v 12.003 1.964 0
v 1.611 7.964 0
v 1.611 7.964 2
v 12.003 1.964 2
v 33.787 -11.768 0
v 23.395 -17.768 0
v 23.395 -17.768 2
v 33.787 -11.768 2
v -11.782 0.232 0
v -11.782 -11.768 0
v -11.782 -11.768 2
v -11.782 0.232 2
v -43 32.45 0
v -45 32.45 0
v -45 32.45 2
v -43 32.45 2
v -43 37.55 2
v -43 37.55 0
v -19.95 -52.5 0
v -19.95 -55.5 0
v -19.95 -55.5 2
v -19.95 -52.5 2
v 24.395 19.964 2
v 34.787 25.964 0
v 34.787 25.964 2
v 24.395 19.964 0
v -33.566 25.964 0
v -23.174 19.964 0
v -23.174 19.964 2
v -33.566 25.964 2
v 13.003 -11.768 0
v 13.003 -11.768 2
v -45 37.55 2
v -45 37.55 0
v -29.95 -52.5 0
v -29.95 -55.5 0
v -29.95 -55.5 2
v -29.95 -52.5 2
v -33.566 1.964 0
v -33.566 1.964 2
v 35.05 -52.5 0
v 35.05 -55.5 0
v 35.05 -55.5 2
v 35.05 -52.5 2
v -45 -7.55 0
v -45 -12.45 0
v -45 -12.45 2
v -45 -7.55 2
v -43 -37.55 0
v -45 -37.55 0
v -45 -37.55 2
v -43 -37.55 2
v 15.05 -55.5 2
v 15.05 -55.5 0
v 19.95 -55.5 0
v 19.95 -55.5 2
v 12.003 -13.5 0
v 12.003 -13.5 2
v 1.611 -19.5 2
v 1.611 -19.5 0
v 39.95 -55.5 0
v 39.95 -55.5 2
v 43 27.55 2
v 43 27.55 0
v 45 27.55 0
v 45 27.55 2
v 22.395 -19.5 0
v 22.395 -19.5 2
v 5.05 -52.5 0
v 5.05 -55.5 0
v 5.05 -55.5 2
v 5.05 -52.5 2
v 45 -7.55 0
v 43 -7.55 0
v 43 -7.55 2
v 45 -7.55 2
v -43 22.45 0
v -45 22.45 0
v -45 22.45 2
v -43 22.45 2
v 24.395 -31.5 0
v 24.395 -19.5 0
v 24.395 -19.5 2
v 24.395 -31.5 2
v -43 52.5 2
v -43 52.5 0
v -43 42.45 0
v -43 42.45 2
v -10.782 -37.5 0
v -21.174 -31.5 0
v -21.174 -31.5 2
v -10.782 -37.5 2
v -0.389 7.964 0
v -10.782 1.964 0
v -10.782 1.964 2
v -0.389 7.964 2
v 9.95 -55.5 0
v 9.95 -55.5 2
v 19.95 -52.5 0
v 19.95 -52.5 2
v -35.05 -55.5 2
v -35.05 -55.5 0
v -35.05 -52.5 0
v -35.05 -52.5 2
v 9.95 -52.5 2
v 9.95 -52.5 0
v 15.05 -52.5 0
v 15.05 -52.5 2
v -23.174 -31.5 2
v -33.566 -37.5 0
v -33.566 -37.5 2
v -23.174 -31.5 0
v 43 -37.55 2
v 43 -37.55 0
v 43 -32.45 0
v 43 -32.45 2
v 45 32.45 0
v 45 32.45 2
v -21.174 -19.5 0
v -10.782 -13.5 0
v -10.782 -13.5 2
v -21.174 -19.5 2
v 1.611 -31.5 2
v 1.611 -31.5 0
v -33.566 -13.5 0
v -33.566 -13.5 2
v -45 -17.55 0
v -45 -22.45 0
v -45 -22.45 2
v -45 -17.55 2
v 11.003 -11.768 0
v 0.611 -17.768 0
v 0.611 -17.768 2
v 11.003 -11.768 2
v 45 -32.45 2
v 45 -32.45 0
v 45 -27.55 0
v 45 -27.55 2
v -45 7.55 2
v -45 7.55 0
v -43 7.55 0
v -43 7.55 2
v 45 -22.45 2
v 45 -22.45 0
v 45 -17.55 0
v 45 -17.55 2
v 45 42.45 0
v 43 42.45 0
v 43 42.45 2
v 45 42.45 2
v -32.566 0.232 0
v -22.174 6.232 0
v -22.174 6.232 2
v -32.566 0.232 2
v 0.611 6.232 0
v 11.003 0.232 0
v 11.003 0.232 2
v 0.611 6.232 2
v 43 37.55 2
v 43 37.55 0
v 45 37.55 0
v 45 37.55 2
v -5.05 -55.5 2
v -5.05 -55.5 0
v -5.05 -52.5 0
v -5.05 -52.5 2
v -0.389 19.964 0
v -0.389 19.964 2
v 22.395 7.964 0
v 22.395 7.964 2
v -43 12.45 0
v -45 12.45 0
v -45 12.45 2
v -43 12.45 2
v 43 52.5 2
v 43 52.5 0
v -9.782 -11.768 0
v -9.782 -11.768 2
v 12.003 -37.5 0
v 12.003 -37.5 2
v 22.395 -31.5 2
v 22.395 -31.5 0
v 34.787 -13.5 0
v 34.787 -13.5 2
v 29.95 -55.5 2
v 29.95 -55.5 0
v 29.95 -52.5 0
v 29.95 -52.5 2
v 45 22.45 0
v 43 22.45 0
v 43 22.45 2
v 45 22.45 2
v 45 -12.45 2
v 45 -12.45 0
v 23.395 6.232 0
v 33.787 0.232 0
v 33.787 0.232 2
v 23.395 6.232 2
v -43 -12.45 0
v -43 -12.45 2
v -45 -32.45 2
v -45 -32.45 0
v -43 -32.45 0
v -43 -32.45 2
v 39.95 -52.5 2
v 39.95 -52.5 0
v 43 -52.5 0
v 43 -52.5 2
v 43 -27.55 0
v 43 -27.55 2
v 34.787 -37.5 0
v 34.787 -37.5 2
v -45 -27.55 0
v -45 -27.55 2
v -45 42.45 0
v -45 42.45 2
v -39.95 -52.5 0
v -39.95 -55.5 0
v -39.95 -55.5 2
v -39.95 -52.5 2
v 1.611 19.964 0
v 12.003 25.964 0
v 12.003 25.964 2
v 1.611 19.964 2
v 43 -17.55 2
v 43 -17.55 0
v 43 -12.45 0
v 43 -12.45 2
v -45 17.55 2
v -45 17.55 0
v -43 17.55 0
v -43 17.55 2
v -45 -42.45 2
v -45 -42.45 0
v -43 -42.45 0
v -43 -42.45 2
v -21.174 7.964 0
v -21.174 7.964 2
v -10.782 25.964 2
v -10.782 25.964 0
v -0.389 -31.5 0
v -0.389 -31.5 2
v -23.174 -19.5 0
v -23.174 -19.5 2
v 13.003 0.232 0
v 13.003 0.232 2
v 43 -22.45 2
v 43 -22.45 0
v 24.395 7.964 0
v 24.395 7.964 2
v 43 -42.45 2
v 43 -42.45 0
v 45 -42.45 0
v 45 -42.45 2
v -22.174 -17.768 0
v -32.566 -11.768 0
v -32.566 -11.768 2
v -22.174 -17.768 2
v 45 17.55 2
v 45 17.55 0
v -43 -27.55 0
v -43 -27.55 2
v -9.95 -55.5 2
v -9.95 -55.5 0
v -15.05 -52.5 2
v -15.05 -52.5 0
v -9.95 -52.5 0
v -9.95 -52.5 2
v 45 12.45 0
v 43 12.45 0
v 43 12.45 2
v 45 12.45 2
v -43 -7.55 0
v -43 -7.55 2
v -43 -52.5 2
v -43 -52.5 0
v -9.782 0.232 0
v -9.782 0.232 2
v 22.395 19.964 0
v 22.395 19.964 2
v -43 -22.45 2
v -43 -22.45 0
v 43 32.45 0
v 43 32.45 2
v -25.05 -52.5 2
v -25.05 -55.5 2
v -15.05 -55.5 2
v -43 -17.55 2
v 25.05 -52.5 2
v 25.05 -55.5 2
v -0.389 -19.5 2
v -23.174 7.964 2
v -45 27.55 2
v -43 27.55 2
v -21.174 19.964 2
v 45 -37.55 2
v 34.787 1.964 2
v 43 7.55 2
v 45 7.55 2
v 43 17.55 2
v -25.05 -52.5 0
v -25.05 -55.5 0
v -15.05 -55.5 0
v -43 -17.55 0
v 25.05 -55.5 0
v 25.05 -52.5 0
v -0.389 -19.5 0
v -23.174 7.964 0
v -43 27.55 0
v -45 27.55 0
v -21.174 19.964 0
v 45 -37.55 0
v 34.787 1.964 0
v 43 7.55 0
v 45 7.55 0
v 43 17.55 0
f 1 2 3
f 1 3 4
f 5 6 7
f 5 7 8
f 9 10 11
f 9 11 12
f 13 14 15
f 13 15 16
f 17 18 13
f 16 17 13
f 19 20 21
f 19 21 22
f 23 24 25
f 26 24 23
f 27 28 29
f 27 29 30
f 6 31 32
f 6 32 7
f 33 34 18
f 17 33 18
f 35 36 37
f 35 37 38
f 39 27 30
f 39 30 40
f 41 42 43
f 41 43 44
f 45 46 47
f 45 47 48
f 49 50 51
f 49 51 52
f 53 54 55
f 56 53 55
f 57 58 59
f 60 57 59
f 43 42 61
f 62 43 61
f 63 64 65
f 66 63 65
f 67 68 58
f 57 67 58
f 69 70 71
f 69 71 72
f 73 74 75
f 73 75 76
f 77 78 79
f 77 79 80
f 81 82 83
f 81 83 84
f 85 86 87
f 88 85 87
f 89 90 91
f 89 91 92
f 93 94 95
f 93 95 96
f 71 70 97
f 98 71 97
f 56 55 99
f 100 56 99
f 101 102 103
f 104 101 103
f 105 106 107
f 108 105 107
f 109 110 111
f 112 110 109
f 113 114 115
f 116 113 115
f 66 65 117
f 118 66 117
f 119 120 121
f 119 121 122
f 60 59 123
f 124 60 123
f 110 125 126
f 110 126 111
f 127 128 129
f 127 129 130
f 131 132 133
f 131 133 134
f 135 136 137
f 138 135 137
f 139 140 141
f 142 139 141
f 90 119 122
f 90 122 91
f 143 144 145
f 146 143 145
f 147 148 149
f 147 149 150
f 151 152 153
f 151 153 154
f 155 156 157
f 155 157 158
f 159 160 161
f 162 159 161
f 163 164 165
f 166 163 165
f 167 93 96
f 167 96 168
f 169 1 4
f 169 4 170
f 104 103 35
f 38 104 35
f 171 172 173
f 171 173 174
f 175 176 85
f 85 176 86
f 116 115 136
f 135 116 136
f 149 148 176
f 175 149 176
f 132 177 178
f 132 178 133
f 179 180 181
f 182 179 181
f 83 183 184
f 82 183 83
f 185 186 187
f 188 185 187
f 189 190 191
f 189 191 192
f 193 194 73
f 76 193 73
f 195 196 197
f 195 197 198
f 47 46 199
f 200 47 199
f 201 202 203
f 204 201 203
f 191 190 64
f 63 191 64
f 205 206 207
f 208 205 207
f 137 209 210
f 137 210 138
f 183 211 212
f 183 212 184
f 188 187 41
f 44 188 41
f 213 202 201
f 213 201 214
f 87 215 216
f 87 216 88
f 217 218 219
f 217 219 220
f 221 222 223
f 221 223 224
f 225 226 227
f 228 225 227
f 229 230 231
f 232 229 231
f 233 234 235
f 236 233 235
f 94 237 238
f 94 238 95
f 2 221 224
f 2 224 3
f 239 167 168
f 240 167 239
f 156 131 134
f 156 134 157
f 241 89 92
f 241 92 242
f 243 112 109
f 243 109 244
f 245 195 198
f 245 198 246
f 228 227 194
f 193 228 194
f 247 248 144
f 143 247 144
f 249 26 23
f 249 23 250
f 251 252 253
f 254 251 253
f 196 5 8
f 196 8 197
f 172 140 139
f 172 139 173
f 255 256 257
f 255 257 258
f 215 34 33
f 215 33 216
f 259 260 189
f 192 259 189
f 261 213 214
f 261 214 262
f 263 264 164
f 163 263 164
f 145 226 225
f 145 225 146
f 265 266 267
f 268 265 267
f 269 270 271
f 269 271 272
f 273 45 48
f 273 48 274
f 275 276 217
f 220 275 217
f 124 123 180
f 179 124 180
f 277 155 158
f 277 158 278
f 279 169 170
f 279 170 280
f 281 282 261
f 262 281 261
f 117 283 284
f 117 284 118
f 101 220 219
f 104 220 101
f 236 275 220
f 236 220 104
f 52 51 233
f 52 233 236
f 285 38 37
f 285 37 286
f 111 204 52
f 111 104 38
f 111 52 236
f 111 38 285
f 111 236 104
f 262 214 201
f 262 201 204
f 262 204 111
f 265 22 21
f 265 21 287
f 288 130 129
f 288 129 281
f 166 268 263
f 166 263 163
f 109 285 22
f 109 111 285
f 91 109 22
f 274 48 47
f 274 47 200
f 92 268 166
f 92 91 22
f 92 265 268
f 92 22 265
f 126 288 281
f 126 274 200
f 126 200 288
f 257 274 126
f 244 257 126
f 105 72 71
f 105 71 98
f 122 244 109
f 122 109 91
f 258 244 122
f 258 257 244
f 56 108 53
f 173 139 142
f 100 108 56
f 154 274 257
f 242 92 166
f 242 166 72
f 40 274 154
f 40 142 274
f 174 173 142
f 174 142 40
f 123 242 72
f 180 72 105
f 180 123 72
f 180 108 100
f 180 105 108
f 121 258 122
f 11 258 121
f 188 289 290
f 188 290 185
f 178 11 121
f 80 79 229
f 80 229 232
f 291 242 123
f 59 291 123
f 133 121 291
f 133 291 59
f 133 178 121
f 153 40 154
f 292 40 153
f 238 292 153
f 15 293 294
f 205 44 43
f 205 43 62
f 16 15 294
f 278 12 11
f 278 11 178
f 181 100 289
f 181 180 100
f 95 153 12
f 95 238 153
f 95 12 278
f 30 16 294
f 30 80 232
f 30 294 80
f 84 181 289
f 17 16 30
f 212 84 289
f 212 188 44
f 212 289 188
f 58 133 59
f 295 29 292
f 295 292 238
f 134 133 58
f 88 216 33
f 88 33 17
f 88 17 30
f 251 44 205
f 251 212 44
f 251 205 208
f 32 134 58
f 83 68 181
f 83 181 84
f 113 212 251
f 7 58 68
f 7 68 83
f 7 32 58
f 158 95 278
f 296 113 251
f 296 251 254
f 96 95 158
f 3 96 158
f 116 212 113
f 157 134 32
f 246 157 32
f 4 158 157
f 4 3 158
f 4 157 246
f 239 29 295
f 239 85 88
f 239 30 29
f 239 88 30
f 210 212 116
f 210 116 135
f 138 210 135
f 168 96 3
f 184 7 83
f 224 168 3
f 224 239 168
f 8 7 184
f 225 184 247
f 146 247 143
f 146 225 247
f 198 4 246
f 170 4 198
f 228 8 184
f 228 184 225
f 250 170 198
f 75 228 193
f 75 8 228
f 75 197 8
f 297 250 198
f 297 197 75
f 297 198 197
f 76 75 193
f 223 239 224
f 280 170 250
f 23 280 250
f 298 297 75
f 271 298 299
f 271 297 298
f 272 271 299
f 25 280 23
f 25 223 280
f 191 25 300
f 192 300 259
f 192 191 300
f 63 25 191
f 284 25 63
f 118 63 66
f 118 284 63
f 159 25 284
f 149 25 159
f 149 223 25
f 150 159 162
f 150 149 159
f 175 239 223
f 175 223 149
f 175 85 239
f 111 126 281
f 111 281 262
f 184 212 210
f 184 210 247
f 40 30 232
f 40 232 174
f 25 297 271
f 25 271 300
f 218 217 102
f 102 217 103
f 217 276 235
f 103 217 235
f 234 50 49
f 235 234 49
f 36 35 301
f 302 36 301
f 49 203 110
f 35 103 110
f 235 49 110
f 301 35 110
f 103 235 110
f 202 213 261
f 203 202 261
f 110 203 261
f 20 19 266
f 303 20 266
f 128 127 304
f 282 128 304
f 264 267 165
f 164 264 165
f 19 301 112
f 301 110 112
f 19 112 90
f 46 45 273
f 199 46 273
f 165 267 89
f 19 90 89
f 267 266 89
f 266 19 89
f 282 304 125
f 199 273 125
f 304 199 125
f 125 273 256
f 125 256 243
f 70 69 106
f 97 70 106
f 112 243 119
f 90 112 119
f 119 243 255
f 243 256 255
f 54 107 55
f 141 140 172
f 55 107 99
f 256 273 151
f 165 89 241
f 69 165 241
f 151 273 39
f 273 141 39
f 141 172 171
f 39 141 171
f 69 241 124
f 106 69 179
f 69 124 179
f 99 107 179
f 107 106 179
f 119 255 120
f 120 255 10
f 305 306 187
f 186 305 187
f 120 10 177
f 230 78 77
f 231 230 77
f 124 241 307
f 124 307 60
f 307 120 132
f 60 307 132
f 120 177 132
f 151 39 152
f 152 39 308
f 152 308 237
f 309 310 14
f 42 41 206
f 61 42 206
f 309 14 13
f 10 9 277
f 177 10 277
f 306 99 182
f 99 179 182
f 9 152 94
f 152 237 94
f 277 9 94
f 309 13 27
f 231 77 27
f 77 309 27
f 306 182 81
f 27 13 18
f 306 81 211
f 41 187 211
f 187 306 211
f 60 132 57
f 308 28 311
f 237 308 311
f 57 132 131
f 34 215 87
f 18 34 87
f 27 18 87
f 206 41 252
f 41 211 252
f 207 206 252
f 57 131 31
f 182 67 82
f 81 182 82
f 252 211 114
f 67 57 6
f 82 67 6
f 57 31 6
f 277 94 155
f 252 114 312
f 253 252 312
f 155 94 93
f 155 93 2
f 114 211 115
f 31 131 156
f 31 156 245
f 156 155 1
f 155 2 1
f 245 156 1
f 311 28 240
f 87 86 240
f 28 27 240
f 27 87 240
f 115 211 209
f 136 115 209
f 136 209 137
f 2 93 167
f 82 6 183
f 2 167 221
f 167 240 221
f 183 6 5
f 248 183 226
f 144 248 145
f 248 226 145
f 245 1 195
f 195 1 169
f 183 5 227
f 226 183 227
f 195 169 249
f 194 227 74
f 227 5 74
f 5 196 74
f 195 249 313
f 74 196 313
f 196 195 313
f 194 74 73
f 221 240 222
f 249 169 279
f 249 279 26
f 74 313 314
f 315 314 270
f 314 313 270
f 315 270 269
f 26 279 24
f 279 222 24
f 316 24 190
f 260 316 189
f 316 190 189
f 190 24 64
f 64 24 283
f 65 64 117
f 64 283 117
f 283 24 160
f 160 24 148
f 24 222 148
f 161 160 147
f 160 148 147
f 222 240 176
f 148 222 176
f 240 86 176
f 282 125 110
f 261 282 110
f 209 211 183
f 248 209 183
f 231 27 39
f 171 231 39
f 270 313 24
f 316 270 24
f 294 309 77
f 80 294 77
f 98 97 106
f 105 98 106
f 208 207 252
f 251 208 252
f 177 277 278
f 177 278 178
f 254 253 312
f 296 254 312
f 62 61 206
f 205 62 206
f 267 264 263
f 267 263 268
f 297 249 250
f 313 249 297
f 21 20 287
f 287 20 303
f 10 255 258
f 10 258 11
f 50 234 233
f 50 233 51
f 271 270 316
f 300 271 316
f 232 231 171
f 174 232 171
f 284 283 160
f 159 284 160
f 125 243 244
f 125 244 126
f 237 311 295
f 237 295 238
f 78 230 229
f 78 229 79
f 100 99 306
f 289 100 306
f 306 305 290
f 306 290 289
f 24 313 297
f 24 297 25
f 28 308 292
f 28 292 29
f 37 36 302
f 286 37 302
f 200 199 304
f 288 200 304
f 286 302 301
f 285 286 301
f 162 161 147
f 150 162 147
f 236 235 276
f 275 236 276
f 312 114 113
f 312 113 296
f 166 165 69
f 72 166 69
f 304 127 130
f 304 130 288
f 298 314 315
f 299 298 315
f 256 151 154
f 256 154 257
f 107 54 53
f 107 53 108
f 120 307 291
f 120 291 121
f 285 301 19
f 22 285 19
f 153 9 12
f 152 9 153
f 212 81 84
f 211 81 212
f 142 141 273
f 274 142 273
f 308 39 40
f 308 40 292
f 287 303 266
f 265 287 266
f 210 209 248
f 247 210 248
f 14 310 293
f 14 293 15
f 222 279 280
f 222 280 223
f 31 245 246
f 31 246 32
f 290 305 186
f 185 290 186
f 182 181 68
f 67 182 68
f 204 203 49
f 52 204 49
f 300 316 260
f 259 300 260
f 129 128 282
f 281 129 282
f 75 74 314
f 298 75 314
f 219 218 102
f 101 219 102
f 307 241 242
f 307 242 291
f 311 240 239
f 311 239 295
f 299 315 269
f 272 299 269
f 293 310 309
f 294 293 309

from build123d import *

# Parameters (mm, degrees)
F0_W     = 2
F0_H     = 4.9
F0_W_2   = 4.9
F0_H_2   = 3
F2_DEPTH = 2
F3_DEPTH = 12.5


with BuildPart() as f2:
    # F0 (on Top) → F2 (new body)
    with BuildSketch(Plane.XY):
        with Locations((44, -20)):
            Rectangle(F0_W, F0_H)
        with Locations((-7.5, -54)):
            Rectangle(F0_W_2, F0_H_2)
        with Locations((44, 30)):
            Rectangle(F0_W, F0_H)
        with Locations((17.5, -54)):
            Rectangle(F0_W_2, F0_H_2)
        with Locations((44, 20)):
            Rectangle(F0_W, F0_H)
        with Locations((-44, 30)):
            Rectangle(F0_W, F0_H)
        with Locations((-44, -30)):
            Rectangle(F0_W, F0_H)
        with Locations((44, 10)):
            Rectangle(F0_W, F0_H)
        with Locations((-44, 40)):
            Rectangle(F0_W, F0_H)
        with Locations((-44, -40)):
            Rectangle(F0_W, F0_H)
        with Locations((44, -10)):
            Rectangle(F0_W, F0_H)
        with Locations((-44, 20)):
            Rectangle(F0_W, F0_H)
        with Locations((-44, -20)):
            Rectangle(F0_W, F0_H)
        with Locations((44, 40)):
            Rectangle(F0_W, F0_H)
        with Locations((-44, 10)):
            Rectangle(F0_W, F0_H)
        with Locations((-44, -10)):
            Rectangle(F0_W, F0_H)
        with Locations((-27.5, -54)):
            Rectangle(F0_W_2, F0_H_2)
        with Locations((7.5, -54)):
            Rectangle(F0_W_2, F0_H_2)
        with Locations((-17.5, -54)):
            Rectangle(F0_W_2, F0_H_2)
        with Locations((-37.5, -54)):
            Rectangle(F0_W_2, F0_H_2)
        Polygon((43, 52.5), (-43, 52.5), (-43, 42.45), (-43, 37.55), (-43, 32.45), (-43, 27.55), (-43, 22.45), (-43, 17.55), (-43, 12.45), (-43, 7.55), (-43, -7.55), (-43, -12.45), (-43, -17.55), (-43, -22.45), (-43, -27.55), (-43, -32.45), (-43, -37.55), (-43, -42.45), (-43, -52.5), (-39.95, -52.5), (-35.05, -52.5), (-29.95, -52.5), (-25.05, -52.5), (-19.95, -52.5), (-15.05, -52.5), (-9.95, -52.5), (-5.05, -52.5), (5.05, -52.5), (9.95, -52.5), (15.05, -52.5), (19.95, -52.5), (25.05, -52.5), (29.95, -52.5), (35.05, -52.5), (39.95, -52.5), (43, -52.5), (43, -42.45), (43, -37.55), (43, -32.45), (43, -27.55), (43, -22.45), (43, -17.55), (43, -12.45), (43, -7.55), (43, 7.55), (43, 12.45), (43, 17.55), (43, 22.45), (43, 27.55), (43, 32.45), (43, 37.55), (43, 42.45), align=None)
        with Locations((27.5, -54)):
            Rectangle(F0_W_2, F0_H_2)
        with Locations((44, -30)):
            Rectangle(F0_W, F0_H)
        with Locations((37.5, -54)):
            Rectangle(F0_W_2, F0_H_2)
        with Locations((44, -40)):
            Rectangle(F0_W, F0_H)
    extrude(amount=F2_DEPTH)

    # F1 (on face) → F3 (cut, symmetric)
    with BuildSketch(Plane.XY):
        Polygon((-23.174025, -19.499996), (-33.56633, -13.5), (-33.56633, -37.5), (-23.174025, -31.499996), align=None)
        Polygon((-33.56633, 1.964102), (-23.174025, 7.964102), (-23.174025, 19.964102), (-33.56633, 25.964102), align=None)
        Polygon((-10.78172, 1.964102), (-0.389415, 7.964102), (-0.389415, 19.964102), (-10.78172, 25.964102), (-21.174025, 19.964102), (-21.174025, 7.964102), align=None)
        Polygon((12.00289, 1.964102), (22.395195, 7.964102), (22.395195, 19.964102), (12.00289, 25.964102), (1.610585, 19.964102), (1.610585, 7.964102), align=None)
        Polygon((24.395195, 7.964102), (34.787499, 1.964102), (34.787499, 25.964102), (24.395195, 19.964102), align=None)
        Polygon((34.787499, -37.5), (34.787499, -13.5), (24.395195, -19.5), (24.395195, -31.5), align=None)
        Polygon((-22.174025, -17.767949), (-11.78172, -11.767949), (-11.78172, 0.232051), (-22.174025, 6.232051), (-32.56633, 0.232051), (-32.56633, -11.767949), align=None)
        Polygon((0.610585, -17.767949), (11.00289, -11.767949), (11.00289, 0.232051), (0.610585, 6.232051), (-9.78172, 0.232051), (-9.78172, -11.767949), align=None)
        Polygon((23.395195, -17.767949), (33.787499, -11.767949), (33.787499, 0.232051), (23.395195, 6.232051), (13.00289, 0.232051), (13.00289, -11.767949), align=None)
        Polygon((-10.78172, -37.5), (-0.389415, -31.5), (-0.389415, -19.5), (-10.78172, -13.5), (-21.174025, -19.5), (-21.174025, -31.5), align=None)
        Polygon((12.00289, -37.5), (22.395195, -31.5), (22.395195, -19.5), (12.00289, -13.5), (1.610585, -19.5), (1.610585, -31.5), align=None)
    extrude(amount=F3_DEPTH, both=True, mode=Mode.SUBTRACT)


solid = f2.part
